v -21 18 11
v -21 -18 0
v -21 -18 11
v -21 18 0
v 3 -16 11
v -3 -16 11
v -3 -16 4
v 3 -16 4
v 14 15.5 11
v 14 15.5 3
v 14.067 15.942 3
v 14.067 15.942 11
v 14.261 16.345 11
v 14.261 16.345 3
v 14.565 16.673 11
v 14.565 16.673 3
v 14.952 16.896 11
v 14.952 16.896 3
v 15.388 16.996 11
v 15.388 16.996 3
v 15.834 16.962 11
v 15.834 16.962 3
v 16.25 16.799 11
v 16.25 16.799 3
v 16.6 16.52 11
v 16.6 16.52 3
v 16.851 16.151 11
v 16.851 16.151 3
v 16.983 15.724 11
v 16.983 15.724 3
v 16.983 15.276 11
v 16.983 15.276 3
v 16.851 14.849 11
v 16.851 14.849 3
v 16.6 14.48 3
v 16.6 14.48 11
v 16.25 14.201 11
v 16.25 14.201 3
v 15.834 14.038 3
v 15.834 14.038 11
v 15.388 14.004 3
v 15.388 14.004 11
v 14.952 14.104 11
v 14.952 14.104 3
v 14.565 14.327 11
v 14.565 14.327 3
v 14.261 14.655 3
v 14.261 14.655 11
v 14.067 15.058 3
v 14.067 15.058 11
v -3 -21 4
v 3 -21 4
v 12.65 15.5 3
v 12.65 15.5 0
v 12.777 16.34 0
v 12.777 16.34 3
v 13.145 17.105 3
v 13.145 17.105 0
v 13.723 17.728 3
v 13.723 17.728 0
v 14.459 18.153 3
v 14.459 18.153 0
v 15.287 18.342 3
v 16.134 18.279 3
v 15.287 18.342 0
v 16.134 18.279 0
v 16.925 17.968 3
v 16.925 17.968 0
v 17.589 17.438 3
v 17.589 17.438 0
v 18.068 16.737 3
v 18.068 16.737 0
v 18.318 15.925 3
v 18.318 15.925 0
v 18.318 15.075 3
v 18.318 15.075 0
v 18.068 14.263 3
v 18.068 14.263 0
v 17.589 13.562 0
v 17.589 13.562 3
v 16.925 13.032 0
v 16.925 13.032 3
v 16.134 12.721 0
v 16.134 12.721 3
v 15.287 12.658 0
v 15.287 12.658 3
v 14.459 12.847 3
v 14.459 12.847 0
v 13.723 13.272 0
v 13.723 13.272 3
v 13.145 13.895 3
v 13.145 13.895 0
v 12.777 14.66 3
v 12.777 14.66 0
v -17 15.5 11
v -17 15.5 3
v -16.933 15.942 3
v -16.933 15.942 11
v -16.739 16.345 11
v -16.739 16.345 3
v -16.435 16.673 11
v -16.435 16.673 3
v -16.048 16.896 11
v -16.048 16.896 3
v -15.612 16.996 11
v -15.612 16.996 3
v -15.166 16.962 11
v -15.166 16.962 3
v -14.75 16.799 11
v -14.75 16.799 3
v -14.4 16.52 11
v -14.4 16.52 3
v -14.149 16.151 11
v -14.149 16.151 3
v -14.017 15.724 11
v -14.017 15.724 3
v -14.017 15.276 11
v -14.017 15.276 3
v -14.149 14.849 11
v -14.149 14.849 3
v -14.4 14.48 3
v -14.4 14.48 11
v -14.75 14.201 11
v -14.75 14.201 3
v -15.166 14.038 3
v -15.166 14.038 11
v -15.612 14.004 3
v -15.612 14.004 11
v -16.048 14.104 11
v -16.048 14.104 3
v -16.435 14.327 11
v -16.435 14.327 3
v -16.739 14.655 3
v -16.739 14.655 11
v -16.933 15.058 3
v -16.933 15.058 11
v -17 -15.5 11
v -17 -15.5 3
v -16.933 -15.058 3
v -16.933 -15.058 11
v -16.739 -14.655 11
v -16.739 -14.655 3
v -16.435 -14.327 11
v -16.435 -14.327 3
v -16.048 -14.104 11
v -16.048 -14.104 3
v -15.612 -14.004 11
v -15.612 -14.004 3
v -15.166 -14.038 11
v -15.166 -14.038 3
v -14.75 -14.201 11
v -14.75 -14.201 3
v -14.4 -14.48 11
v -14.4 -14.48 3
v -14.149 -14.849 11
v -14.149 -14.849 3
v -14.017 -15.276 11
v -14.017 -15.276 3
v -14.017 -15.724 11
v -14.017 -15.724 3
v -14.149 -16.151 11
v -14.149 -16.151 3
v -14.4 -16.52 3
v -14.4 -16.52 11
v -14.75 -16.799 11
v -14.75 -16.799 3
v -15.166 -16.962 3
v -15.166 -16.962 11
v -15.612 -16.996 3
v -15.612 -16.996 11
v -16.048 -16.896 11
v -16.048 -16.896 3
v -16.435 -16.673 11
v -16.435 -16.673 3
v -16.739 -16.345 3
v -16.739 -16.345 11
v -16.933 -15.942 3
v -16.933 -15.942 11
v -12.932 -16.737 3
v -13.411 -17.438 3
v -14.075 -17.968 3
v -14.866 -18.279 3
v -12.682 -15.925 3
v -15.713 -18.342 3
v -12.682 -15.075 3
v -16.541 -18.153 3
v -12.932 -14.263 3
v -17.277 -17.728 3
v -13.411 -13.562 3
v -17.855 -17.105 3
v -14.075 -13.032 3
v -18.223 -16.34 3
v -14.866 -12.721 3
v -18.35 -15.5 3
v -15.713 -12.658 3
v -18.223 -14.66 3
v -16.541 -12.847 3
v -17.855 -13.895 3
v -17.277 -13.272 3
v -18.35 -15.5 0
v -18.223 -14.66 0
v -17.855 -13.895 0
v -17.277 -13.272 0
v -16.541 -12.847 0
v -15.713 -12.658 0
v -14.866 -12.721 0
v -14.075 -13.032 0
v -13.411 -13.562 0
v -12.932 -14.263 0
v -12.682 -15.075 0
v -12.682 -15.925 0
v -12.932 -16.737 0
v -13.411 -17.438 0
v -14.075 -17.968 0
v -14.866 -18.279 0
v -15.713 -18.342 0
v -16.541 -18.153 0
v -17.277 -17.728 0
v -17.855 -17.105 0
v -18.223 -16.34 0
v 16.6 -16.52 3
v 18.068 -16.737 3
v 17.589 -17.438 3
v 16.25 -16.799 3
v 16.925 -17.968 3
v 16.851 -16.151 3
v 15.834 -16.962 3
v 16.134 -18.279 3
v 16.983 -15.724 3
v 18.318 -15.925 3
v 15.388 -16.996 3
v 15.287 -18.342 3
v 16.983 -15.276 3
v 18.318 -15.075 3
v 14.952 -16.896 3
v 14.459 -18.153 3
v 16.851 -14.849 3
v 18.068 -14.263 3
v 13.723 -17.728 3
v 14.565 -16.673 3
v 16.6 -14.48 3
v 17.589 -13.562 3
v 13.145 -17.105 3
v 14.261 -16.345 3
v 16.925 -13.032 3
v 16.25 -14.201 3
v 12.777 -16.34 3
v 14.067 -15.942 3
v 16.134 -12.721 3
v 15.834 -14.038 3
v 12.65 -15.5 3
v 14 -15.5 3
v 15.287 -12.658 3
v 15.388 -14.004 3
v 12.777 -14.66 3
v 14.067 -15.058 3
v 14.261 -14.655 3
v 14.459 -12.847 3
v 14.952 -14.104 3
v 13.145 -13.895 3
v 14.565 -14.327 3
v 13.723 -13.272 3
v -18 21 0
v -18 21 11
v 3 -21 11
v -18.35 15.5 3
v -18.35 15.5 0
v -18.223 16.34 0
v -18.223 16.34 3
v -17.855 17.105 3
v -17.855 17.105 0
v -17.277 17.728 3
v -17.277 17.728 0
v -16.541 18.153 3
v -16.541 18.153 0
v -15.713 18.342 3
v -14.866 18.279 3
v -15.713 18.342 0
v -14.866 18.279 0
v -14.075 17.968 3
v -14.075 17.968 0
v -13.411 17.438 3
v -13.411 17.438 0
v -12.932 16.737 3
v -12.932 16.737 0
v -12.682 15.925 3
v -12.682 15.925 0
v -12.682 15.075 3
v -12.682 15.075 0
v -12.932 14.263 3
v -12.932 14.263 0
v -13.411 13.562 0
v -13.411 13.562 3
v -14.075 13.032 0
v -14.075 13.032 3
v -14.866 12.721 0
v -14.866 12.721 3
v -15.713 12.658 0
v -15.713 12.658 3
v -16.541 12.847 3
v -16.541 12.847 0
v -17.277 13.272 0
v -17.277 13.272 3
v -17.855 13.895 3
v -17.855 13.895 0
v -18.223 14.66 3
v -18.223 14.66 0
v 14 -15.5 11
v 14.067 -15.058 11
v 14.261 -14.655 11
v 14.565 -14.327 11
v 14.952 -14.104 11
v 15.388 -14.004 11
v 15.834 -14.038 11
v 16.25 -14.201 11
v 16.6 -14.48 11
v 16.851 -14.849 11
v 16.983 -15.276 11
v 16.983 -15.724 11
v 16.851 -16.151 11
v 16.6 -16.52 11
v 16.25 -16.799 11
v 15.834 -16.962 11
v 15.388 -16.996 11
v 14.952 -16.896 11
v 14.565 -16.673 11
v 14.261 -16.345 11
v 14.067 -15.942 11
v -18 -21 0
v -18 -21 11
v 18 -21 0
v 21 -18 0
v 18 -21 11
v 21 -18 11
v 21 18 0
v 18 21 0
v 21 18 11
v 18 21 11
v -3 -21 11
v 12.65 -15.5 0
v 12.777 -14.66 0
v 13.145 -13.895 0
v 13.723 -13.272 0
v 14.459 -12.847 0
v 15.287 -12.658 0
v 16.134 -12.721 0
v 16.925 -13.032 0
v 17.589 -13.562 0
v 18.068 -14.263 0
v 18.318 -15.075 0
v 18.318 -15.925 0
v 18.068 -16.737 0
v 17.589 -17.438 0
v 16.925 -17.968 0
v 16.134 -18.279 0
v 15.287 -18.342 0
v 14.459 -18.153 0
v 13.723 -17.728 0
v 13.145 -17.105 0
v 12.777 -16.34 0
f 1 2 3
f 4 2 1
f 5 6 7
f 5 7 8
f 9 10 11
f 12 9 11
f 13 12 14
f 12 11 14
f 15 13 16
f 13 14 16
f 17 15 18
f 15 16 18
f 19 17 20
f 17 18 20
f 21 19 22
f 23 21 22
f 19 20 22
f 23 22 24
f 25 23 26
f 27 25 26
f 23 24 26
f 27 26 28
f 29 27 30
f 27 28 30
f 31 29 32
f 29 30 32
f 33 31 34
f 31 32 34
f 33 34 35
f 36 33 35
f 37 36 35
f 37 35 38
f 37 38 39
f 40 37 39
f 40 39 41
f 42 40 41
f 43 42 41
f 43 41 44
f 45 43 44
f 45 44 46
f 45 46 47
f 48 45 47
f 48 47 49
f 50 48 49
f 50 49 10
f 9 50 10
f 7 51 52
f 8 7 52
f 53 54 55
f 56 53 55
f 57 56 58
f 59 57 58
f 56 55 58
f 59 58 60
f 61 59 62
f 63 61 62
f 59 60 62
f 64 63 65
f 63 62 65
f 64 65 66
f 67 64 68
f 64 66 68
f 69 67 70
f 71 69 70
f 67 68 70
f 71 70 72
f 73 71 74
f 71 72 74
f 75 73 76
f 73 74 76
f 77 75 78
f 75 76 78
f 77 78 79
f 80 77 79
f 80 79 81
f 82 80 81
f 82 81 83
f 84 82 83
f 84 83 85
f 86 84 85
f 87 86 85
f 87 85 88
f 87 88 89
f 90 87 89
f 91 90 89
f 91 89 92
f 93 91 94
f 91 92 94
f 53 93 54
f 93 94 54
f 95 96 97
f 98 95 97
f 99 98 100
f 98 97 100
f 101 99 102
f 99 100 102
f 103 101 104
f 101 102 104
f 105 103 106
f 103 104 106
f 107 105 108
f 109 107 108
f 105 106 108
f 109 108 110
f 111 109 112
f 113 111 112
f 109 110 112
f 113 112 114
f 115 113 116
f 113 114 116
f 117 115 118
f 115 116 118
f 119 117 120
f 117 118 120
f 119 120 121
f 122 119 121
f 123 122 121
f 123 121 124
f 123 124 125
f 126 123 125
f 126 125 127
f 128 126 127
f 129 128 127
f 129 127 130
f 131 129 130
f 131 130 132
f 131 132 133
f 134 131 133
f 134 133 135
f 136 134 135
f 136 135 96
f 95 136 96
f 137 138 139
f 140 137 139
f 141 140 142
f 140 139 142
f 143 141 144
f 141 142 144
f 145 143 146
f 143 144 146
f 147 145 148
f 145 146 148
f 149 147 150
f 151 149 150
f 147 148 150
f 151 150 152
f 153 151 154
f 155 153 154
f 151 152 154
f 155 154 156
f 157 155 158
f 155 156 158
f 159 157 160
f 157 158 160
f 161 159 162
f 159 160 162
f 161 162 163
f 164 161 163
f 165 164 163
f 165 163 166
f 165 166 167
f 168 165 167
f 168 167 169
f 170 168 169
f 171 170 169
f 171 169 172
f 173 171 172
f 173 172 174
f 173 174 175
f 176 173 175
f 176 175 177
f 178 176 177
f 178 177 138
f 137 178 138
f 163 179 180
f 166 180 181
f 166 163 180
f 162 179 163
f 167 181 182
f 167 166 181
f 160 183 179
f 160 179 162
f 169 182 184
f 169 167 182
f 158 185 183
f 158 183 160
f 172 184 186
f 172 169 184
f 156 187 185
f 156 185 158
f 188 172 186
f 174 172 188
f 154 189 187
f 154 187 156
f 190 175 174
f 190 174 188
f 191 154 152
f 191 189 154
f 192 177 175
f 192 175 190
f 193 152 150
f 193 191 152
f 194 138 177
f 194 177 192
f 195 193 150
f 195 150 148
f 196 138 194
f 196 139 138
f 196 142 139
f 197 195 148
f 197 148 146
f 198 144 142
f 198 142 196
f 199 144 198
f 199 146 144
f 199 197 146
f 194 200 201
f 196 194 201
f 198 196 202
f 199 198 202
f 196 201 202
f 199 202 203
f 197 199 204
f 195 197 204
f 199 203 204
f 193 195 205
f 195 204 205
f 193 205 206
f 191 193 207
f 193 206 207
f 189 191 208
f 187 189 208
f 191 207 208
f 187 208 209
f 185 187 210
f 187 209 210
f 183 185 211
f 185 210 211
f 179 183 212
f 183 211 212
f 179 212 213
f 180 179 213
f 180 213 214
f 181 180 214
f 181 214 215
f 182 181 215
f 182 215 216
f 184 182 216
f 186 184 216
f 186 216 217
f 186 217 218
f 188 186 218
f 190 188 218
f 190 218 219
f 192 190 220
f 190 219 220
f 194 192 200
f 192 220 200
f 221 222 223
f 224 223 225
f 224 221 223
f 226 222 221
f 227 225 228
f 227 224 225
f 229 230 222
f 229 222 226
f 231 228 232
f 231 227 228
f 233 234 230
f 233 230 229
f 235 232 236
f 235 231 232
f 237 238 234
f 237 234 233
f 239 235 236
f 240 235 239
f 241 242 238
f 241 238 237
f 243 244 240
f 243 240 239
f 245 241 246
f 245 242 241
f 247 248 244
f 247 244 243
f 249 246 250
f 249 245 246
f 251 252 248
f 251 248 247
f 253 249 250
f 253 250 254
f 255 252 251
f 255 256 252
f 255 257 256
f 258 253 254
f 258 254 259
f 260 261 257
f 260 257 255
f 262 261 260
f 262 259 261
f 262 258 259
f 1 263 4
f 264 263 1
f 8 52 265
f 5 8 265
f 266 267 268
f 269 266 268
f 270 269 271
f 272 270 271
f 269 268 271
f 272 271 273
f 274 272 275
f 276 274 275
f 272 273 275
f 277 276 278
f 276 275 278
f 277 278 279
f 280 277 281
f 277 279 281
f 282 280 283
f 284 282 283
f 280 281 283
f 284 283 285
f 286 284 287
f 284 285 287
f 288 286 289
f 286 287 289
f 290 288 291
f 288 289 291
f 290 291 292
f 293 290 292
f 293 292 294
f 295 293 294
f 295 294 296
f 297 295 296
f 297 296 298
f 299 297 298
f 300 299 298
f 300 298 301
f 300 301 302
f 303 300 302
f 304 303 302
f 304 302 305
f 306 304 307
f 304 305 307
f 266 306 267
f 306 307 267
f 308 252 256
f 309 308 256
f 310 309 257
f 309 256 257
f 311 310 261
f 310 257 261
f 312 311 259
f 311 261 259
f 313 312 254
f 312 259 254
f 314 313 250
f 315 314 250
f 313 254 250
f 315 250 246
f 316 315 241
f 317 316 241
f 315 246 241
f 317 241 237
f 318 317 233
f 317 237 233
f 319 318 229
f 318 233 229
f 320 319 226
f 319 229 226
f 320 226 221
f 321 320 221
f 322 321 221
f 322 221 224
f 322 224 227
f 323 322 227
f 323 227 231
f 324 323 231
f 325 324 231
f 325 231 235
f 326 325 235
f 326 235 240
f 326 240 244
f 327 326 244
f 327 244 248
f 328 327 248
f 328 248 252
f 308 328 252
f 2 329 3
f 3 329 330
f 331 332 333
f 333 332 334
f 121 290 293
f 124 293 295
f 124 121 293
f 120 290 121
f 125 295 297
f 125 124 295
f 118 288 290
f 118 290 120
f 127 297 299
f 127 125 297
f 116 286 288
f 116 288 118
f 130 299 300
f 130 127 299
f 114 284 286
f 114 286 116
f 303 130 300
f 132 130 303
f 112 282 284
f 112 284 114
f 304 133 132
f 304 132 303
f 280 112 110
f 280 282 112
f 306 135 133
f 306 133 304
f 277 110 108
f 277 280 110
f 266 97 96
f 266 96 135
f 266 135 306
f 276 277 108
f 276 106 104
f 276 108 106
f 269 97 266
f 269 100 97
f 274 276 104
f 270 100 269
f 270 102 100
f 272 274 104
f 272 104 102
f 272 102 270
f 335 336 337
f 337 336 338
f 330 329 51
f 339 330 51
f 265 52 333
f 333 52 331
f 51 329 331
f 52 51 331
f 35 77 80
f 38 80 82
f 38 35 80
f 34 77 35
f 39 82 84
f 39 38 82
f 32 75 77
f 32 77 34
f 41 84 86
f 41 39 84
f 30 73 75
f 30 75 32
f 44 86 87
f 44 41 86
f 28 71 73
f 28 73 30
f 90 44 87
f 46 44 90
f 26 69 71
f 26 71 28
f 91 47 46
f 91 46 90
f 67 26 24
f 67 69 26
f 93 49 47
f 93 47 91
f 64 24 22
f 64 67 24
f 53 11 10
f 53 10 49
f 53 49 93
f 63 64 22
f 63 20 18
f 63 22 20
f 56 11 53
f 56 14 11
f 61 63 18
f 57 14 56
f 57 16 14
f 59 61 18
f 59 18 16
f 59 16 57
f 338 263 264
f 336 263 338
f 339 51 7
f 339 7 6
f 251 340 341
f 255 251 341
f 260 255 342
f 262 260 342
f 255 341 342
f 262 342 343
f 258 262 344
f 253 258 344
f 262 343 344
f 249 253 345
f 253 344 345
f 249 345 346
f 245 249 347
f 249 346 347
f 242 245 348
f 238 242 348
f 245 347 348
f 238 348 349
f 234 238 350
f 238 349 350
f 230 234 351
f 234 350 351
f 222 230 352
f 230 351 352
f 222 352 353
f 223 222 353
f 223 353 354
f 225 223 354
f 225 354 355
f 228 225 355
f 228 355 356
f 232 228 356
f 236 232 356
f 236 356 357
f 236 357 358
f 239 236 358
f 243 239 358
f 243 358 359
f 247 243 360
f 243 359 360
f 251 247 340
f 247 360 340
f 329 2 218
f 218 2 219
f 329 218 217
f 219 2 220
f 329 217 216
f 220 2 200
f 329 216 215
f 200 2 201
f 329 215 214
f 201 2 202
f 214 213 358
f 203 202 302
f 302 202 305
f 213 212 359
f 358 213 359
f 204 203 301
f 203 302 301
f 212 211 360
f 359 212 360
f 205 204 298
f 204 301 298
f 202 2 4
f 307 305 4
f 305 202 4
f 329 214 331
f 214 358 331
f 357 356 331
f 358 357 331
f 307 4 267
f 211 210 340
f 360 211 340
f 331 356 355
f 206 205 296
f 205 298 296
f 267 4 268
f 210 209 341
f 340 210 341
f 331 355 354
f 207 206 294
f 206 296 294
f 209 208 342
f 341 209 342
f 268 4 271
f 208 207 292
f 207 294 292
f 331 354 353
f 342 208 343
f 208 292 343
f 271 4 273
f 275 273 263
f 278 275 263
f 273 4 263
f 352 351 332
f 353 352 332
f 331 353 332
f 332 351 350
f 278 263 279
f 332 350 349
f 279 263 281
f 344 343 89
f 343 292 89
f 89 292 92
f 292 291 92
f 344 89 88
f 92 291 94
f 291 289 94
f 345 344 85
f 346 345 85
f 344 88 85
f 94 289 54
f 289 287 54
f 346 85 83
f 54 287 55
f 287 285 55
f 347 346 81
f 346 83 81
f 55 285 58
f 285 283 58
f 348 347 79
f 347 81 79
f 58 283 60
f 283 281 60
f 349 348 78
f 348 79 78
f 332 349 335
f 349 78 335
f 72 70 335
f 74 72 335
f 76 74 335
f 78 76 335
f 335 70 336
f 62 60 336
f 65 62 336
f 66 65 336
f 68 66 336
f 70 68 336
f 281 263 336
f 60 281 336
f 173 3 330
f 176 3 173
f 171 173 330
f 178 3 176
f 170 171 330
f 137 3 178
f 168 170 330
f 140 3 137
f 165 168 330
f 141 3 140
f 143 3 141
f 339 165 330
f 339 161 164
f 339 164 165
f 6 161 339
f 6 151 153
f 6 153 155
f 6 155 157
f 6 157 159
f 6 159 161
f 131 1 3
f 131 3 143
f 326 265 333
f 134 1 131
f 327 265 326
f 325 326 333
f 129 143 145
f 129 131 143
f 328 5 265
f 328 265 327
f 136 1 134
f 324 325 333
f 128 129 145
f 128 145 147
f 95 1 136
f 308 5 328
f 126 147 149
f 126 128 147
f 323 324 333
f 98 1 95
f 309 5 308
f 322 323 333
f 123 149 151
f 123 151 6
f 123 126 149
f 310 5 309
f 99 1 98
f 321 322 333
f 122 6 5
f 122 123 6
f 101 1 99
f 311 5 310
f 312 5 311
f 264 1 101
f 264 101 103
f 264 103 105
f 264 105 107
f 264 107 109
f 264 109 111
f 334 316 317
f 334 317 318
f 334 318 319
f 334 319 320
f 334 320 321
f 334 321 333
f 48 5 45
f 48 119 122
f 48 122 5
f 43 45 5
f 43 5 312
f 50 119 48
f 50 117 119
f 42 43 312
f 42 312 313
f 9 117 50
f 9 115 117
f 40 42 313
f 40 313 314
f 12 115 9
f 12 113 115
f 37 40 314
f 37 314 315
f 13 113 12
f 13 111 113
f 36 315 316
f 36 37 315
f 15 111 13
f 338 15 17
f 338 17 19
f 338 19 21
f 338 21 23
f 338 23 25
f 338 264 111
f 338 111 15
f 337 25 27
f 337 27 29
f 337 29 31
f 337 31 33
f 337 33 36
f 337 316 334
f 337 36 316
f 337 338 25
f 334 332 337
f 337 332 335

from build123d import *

# Parameters (mm, degrees)
SKETCH1_W           = 42
SKETCH1_H           = 42
BOSS_EXTRUDE1_DEPTH = 11
CHAMFER1_SIZE       = 3
CUT_EXTRUDE2_REACH  = 33.67
SKETCH3_R           = 1.5
SKETCH4_R           = 2.85
CUT_EXTRUDE3_DEPTH  = 3
SKETCH5_W           = 6
SKETCH5_H           = 7
CUT_EXTRUDE4_DEPTH  = 5


with BuildPart() as part:
    # Sketch1 → Boss-Extrude1 (new body)
    with BuildSketch(Plane.XY):
        Rectangle(SKETCH1_W, SKETCH1_H)
    extrude(amount=BOSS_EXTRUDE1_DEPTH)

    # Chamfer1
    chamfer1_edges = [part.edges().sort_by_distance(p)[0] for p in [
        (-21, 21, 5.5),
        (21, 21, 5.5),
        (21, -21, 5.5),
        (-21, -21, 5.5),
    ]]
    chamfer(chamfer1_edges, length=CHAMFER1_SIZE)

    # Sketch3 → Cut-Extrude2 (cut, up to next)
    with BuildSketch(Plane(origin=(0, 0, 0), x_dir=(-1, 0, 0), z_dir=(0, 0, -1)), mode=Mode.PRIVATE) as cut_extrude2_sk1:
        with Locations((-15.5, 15.5)):
            Circle(SKETCH3_R)
    cut_extrude2_tool1 = extrude(cut_extrude2_sk1.sketch, amount=-CUT_EXTRUDE2_REACH, mode=Mode.PRIVATE) & part.part
    # Sketch3 → Cut-Extrude2 (cut, up to next)
    with BuildSketch(Plane(origin=(0, 0, 0), x_dir=(-1, 0, 0), z_dir=(0, 0, -1)), mode=Mode.PRIVATE) as cut_extrude2_sk2:
        with Locations((15.5, 15.5)):
            Circle(SKETCH3_R)
    cut_extrude2_tool2 = extrude(cut_extrude2_sk2.sketch, amount=-CUT_EXTRUDE2_REACH, mode=Mode.PRIVATE) & part.part
    # Sketch3 → Cut-Extrude2 (cut, up to next)
    with BuildSketch(Plane(origin=(0, 0, 0), x_dir=(-1, 0, 0), z_dir=(0, 0, -1)), mode=Mode.PRIVATE) as cut_extrude2_sk3:
        with Locations((15.5, -15.5)):
            Circle(SKETCH3_R)
    cut_extrude2_tool3 = extrude(cut_extrude2_sk3.sketch, amount=-CUT_EXTRUDE2_REACH, mode=Mode.PRIVATE) & part.part
    # Sketch3 → Cut-Extrude2 (cut, up to next)
    with BuildSketch(Plane(origin=(0, 0, 0), x_dir=(-1, 0, 0), z_dir=(0, 0, -1)), mode=Mode.PRIVATE) as cut_extrude2_sk4:
        with Locations((-15.5, -15.5)):
            Circle(SKETCH3_R)
    cut_extrude2_tool4 = extrude(cut_extrude2_sk4.sketch, amount=-CUT_EXTRUDE2_REACH, mode=Mode.PRIVATE) & part.part
    add(cut_extrude2_tool1.solids().sort_by_distance((15.5, 15.5, 0))[0], mode=Mode.SUBTRACT)
    add(cut_extrude2_tool2.solids().sort_by_distance((-15.5, 15.5, 0))[0], mode=Mode.SUBTRACT)
    add(cut_extrude2_tool3.solids().sort_by_distance((-15.5, -15.5, 0))[0], mode=Mode.SUBTRACT)
    add(cut_extrude2_tool4.solids().sort_by_distance((15.5, -15.5, 0))[0], mode=Mode.SUBTRACT)

    # Sketch4 → Cut-Extrude3 (cut)
    with BuildSketch(Plane(origin=(0, 0, 0), x_dir=(-1, 0, 0), z_dir=(0, 0, -1))):
        with Locations((-15.5, 15.5)):
            Circle(SKETCH4_R)
        with Locations((15.5, 15.5)):
            Circle(SKETCH4_R)
        with Locations((15.5, -15.5)):
            Circle(SKETCH4_R)
        with Locations((-15.5, -15.5)):
            Circle(SKETCH4_R)
    extrude(amount=-CUT_EXTRUDE3_DEPTH, mode=Mode.SUBTRACT)

    # Sketch5 → Cut-Extrude4 (cut)
    with BuildSketch(Plane.XZ.offset(21)):
        with Locations((0, 7.5)):
            Rectangle(SKETCH5_W, SKETCH5_H)
    extrude(amount=-CUT_EXTRUDE4_DEPTH, mode=Mode.SUBTRACT)


solid = part.part
